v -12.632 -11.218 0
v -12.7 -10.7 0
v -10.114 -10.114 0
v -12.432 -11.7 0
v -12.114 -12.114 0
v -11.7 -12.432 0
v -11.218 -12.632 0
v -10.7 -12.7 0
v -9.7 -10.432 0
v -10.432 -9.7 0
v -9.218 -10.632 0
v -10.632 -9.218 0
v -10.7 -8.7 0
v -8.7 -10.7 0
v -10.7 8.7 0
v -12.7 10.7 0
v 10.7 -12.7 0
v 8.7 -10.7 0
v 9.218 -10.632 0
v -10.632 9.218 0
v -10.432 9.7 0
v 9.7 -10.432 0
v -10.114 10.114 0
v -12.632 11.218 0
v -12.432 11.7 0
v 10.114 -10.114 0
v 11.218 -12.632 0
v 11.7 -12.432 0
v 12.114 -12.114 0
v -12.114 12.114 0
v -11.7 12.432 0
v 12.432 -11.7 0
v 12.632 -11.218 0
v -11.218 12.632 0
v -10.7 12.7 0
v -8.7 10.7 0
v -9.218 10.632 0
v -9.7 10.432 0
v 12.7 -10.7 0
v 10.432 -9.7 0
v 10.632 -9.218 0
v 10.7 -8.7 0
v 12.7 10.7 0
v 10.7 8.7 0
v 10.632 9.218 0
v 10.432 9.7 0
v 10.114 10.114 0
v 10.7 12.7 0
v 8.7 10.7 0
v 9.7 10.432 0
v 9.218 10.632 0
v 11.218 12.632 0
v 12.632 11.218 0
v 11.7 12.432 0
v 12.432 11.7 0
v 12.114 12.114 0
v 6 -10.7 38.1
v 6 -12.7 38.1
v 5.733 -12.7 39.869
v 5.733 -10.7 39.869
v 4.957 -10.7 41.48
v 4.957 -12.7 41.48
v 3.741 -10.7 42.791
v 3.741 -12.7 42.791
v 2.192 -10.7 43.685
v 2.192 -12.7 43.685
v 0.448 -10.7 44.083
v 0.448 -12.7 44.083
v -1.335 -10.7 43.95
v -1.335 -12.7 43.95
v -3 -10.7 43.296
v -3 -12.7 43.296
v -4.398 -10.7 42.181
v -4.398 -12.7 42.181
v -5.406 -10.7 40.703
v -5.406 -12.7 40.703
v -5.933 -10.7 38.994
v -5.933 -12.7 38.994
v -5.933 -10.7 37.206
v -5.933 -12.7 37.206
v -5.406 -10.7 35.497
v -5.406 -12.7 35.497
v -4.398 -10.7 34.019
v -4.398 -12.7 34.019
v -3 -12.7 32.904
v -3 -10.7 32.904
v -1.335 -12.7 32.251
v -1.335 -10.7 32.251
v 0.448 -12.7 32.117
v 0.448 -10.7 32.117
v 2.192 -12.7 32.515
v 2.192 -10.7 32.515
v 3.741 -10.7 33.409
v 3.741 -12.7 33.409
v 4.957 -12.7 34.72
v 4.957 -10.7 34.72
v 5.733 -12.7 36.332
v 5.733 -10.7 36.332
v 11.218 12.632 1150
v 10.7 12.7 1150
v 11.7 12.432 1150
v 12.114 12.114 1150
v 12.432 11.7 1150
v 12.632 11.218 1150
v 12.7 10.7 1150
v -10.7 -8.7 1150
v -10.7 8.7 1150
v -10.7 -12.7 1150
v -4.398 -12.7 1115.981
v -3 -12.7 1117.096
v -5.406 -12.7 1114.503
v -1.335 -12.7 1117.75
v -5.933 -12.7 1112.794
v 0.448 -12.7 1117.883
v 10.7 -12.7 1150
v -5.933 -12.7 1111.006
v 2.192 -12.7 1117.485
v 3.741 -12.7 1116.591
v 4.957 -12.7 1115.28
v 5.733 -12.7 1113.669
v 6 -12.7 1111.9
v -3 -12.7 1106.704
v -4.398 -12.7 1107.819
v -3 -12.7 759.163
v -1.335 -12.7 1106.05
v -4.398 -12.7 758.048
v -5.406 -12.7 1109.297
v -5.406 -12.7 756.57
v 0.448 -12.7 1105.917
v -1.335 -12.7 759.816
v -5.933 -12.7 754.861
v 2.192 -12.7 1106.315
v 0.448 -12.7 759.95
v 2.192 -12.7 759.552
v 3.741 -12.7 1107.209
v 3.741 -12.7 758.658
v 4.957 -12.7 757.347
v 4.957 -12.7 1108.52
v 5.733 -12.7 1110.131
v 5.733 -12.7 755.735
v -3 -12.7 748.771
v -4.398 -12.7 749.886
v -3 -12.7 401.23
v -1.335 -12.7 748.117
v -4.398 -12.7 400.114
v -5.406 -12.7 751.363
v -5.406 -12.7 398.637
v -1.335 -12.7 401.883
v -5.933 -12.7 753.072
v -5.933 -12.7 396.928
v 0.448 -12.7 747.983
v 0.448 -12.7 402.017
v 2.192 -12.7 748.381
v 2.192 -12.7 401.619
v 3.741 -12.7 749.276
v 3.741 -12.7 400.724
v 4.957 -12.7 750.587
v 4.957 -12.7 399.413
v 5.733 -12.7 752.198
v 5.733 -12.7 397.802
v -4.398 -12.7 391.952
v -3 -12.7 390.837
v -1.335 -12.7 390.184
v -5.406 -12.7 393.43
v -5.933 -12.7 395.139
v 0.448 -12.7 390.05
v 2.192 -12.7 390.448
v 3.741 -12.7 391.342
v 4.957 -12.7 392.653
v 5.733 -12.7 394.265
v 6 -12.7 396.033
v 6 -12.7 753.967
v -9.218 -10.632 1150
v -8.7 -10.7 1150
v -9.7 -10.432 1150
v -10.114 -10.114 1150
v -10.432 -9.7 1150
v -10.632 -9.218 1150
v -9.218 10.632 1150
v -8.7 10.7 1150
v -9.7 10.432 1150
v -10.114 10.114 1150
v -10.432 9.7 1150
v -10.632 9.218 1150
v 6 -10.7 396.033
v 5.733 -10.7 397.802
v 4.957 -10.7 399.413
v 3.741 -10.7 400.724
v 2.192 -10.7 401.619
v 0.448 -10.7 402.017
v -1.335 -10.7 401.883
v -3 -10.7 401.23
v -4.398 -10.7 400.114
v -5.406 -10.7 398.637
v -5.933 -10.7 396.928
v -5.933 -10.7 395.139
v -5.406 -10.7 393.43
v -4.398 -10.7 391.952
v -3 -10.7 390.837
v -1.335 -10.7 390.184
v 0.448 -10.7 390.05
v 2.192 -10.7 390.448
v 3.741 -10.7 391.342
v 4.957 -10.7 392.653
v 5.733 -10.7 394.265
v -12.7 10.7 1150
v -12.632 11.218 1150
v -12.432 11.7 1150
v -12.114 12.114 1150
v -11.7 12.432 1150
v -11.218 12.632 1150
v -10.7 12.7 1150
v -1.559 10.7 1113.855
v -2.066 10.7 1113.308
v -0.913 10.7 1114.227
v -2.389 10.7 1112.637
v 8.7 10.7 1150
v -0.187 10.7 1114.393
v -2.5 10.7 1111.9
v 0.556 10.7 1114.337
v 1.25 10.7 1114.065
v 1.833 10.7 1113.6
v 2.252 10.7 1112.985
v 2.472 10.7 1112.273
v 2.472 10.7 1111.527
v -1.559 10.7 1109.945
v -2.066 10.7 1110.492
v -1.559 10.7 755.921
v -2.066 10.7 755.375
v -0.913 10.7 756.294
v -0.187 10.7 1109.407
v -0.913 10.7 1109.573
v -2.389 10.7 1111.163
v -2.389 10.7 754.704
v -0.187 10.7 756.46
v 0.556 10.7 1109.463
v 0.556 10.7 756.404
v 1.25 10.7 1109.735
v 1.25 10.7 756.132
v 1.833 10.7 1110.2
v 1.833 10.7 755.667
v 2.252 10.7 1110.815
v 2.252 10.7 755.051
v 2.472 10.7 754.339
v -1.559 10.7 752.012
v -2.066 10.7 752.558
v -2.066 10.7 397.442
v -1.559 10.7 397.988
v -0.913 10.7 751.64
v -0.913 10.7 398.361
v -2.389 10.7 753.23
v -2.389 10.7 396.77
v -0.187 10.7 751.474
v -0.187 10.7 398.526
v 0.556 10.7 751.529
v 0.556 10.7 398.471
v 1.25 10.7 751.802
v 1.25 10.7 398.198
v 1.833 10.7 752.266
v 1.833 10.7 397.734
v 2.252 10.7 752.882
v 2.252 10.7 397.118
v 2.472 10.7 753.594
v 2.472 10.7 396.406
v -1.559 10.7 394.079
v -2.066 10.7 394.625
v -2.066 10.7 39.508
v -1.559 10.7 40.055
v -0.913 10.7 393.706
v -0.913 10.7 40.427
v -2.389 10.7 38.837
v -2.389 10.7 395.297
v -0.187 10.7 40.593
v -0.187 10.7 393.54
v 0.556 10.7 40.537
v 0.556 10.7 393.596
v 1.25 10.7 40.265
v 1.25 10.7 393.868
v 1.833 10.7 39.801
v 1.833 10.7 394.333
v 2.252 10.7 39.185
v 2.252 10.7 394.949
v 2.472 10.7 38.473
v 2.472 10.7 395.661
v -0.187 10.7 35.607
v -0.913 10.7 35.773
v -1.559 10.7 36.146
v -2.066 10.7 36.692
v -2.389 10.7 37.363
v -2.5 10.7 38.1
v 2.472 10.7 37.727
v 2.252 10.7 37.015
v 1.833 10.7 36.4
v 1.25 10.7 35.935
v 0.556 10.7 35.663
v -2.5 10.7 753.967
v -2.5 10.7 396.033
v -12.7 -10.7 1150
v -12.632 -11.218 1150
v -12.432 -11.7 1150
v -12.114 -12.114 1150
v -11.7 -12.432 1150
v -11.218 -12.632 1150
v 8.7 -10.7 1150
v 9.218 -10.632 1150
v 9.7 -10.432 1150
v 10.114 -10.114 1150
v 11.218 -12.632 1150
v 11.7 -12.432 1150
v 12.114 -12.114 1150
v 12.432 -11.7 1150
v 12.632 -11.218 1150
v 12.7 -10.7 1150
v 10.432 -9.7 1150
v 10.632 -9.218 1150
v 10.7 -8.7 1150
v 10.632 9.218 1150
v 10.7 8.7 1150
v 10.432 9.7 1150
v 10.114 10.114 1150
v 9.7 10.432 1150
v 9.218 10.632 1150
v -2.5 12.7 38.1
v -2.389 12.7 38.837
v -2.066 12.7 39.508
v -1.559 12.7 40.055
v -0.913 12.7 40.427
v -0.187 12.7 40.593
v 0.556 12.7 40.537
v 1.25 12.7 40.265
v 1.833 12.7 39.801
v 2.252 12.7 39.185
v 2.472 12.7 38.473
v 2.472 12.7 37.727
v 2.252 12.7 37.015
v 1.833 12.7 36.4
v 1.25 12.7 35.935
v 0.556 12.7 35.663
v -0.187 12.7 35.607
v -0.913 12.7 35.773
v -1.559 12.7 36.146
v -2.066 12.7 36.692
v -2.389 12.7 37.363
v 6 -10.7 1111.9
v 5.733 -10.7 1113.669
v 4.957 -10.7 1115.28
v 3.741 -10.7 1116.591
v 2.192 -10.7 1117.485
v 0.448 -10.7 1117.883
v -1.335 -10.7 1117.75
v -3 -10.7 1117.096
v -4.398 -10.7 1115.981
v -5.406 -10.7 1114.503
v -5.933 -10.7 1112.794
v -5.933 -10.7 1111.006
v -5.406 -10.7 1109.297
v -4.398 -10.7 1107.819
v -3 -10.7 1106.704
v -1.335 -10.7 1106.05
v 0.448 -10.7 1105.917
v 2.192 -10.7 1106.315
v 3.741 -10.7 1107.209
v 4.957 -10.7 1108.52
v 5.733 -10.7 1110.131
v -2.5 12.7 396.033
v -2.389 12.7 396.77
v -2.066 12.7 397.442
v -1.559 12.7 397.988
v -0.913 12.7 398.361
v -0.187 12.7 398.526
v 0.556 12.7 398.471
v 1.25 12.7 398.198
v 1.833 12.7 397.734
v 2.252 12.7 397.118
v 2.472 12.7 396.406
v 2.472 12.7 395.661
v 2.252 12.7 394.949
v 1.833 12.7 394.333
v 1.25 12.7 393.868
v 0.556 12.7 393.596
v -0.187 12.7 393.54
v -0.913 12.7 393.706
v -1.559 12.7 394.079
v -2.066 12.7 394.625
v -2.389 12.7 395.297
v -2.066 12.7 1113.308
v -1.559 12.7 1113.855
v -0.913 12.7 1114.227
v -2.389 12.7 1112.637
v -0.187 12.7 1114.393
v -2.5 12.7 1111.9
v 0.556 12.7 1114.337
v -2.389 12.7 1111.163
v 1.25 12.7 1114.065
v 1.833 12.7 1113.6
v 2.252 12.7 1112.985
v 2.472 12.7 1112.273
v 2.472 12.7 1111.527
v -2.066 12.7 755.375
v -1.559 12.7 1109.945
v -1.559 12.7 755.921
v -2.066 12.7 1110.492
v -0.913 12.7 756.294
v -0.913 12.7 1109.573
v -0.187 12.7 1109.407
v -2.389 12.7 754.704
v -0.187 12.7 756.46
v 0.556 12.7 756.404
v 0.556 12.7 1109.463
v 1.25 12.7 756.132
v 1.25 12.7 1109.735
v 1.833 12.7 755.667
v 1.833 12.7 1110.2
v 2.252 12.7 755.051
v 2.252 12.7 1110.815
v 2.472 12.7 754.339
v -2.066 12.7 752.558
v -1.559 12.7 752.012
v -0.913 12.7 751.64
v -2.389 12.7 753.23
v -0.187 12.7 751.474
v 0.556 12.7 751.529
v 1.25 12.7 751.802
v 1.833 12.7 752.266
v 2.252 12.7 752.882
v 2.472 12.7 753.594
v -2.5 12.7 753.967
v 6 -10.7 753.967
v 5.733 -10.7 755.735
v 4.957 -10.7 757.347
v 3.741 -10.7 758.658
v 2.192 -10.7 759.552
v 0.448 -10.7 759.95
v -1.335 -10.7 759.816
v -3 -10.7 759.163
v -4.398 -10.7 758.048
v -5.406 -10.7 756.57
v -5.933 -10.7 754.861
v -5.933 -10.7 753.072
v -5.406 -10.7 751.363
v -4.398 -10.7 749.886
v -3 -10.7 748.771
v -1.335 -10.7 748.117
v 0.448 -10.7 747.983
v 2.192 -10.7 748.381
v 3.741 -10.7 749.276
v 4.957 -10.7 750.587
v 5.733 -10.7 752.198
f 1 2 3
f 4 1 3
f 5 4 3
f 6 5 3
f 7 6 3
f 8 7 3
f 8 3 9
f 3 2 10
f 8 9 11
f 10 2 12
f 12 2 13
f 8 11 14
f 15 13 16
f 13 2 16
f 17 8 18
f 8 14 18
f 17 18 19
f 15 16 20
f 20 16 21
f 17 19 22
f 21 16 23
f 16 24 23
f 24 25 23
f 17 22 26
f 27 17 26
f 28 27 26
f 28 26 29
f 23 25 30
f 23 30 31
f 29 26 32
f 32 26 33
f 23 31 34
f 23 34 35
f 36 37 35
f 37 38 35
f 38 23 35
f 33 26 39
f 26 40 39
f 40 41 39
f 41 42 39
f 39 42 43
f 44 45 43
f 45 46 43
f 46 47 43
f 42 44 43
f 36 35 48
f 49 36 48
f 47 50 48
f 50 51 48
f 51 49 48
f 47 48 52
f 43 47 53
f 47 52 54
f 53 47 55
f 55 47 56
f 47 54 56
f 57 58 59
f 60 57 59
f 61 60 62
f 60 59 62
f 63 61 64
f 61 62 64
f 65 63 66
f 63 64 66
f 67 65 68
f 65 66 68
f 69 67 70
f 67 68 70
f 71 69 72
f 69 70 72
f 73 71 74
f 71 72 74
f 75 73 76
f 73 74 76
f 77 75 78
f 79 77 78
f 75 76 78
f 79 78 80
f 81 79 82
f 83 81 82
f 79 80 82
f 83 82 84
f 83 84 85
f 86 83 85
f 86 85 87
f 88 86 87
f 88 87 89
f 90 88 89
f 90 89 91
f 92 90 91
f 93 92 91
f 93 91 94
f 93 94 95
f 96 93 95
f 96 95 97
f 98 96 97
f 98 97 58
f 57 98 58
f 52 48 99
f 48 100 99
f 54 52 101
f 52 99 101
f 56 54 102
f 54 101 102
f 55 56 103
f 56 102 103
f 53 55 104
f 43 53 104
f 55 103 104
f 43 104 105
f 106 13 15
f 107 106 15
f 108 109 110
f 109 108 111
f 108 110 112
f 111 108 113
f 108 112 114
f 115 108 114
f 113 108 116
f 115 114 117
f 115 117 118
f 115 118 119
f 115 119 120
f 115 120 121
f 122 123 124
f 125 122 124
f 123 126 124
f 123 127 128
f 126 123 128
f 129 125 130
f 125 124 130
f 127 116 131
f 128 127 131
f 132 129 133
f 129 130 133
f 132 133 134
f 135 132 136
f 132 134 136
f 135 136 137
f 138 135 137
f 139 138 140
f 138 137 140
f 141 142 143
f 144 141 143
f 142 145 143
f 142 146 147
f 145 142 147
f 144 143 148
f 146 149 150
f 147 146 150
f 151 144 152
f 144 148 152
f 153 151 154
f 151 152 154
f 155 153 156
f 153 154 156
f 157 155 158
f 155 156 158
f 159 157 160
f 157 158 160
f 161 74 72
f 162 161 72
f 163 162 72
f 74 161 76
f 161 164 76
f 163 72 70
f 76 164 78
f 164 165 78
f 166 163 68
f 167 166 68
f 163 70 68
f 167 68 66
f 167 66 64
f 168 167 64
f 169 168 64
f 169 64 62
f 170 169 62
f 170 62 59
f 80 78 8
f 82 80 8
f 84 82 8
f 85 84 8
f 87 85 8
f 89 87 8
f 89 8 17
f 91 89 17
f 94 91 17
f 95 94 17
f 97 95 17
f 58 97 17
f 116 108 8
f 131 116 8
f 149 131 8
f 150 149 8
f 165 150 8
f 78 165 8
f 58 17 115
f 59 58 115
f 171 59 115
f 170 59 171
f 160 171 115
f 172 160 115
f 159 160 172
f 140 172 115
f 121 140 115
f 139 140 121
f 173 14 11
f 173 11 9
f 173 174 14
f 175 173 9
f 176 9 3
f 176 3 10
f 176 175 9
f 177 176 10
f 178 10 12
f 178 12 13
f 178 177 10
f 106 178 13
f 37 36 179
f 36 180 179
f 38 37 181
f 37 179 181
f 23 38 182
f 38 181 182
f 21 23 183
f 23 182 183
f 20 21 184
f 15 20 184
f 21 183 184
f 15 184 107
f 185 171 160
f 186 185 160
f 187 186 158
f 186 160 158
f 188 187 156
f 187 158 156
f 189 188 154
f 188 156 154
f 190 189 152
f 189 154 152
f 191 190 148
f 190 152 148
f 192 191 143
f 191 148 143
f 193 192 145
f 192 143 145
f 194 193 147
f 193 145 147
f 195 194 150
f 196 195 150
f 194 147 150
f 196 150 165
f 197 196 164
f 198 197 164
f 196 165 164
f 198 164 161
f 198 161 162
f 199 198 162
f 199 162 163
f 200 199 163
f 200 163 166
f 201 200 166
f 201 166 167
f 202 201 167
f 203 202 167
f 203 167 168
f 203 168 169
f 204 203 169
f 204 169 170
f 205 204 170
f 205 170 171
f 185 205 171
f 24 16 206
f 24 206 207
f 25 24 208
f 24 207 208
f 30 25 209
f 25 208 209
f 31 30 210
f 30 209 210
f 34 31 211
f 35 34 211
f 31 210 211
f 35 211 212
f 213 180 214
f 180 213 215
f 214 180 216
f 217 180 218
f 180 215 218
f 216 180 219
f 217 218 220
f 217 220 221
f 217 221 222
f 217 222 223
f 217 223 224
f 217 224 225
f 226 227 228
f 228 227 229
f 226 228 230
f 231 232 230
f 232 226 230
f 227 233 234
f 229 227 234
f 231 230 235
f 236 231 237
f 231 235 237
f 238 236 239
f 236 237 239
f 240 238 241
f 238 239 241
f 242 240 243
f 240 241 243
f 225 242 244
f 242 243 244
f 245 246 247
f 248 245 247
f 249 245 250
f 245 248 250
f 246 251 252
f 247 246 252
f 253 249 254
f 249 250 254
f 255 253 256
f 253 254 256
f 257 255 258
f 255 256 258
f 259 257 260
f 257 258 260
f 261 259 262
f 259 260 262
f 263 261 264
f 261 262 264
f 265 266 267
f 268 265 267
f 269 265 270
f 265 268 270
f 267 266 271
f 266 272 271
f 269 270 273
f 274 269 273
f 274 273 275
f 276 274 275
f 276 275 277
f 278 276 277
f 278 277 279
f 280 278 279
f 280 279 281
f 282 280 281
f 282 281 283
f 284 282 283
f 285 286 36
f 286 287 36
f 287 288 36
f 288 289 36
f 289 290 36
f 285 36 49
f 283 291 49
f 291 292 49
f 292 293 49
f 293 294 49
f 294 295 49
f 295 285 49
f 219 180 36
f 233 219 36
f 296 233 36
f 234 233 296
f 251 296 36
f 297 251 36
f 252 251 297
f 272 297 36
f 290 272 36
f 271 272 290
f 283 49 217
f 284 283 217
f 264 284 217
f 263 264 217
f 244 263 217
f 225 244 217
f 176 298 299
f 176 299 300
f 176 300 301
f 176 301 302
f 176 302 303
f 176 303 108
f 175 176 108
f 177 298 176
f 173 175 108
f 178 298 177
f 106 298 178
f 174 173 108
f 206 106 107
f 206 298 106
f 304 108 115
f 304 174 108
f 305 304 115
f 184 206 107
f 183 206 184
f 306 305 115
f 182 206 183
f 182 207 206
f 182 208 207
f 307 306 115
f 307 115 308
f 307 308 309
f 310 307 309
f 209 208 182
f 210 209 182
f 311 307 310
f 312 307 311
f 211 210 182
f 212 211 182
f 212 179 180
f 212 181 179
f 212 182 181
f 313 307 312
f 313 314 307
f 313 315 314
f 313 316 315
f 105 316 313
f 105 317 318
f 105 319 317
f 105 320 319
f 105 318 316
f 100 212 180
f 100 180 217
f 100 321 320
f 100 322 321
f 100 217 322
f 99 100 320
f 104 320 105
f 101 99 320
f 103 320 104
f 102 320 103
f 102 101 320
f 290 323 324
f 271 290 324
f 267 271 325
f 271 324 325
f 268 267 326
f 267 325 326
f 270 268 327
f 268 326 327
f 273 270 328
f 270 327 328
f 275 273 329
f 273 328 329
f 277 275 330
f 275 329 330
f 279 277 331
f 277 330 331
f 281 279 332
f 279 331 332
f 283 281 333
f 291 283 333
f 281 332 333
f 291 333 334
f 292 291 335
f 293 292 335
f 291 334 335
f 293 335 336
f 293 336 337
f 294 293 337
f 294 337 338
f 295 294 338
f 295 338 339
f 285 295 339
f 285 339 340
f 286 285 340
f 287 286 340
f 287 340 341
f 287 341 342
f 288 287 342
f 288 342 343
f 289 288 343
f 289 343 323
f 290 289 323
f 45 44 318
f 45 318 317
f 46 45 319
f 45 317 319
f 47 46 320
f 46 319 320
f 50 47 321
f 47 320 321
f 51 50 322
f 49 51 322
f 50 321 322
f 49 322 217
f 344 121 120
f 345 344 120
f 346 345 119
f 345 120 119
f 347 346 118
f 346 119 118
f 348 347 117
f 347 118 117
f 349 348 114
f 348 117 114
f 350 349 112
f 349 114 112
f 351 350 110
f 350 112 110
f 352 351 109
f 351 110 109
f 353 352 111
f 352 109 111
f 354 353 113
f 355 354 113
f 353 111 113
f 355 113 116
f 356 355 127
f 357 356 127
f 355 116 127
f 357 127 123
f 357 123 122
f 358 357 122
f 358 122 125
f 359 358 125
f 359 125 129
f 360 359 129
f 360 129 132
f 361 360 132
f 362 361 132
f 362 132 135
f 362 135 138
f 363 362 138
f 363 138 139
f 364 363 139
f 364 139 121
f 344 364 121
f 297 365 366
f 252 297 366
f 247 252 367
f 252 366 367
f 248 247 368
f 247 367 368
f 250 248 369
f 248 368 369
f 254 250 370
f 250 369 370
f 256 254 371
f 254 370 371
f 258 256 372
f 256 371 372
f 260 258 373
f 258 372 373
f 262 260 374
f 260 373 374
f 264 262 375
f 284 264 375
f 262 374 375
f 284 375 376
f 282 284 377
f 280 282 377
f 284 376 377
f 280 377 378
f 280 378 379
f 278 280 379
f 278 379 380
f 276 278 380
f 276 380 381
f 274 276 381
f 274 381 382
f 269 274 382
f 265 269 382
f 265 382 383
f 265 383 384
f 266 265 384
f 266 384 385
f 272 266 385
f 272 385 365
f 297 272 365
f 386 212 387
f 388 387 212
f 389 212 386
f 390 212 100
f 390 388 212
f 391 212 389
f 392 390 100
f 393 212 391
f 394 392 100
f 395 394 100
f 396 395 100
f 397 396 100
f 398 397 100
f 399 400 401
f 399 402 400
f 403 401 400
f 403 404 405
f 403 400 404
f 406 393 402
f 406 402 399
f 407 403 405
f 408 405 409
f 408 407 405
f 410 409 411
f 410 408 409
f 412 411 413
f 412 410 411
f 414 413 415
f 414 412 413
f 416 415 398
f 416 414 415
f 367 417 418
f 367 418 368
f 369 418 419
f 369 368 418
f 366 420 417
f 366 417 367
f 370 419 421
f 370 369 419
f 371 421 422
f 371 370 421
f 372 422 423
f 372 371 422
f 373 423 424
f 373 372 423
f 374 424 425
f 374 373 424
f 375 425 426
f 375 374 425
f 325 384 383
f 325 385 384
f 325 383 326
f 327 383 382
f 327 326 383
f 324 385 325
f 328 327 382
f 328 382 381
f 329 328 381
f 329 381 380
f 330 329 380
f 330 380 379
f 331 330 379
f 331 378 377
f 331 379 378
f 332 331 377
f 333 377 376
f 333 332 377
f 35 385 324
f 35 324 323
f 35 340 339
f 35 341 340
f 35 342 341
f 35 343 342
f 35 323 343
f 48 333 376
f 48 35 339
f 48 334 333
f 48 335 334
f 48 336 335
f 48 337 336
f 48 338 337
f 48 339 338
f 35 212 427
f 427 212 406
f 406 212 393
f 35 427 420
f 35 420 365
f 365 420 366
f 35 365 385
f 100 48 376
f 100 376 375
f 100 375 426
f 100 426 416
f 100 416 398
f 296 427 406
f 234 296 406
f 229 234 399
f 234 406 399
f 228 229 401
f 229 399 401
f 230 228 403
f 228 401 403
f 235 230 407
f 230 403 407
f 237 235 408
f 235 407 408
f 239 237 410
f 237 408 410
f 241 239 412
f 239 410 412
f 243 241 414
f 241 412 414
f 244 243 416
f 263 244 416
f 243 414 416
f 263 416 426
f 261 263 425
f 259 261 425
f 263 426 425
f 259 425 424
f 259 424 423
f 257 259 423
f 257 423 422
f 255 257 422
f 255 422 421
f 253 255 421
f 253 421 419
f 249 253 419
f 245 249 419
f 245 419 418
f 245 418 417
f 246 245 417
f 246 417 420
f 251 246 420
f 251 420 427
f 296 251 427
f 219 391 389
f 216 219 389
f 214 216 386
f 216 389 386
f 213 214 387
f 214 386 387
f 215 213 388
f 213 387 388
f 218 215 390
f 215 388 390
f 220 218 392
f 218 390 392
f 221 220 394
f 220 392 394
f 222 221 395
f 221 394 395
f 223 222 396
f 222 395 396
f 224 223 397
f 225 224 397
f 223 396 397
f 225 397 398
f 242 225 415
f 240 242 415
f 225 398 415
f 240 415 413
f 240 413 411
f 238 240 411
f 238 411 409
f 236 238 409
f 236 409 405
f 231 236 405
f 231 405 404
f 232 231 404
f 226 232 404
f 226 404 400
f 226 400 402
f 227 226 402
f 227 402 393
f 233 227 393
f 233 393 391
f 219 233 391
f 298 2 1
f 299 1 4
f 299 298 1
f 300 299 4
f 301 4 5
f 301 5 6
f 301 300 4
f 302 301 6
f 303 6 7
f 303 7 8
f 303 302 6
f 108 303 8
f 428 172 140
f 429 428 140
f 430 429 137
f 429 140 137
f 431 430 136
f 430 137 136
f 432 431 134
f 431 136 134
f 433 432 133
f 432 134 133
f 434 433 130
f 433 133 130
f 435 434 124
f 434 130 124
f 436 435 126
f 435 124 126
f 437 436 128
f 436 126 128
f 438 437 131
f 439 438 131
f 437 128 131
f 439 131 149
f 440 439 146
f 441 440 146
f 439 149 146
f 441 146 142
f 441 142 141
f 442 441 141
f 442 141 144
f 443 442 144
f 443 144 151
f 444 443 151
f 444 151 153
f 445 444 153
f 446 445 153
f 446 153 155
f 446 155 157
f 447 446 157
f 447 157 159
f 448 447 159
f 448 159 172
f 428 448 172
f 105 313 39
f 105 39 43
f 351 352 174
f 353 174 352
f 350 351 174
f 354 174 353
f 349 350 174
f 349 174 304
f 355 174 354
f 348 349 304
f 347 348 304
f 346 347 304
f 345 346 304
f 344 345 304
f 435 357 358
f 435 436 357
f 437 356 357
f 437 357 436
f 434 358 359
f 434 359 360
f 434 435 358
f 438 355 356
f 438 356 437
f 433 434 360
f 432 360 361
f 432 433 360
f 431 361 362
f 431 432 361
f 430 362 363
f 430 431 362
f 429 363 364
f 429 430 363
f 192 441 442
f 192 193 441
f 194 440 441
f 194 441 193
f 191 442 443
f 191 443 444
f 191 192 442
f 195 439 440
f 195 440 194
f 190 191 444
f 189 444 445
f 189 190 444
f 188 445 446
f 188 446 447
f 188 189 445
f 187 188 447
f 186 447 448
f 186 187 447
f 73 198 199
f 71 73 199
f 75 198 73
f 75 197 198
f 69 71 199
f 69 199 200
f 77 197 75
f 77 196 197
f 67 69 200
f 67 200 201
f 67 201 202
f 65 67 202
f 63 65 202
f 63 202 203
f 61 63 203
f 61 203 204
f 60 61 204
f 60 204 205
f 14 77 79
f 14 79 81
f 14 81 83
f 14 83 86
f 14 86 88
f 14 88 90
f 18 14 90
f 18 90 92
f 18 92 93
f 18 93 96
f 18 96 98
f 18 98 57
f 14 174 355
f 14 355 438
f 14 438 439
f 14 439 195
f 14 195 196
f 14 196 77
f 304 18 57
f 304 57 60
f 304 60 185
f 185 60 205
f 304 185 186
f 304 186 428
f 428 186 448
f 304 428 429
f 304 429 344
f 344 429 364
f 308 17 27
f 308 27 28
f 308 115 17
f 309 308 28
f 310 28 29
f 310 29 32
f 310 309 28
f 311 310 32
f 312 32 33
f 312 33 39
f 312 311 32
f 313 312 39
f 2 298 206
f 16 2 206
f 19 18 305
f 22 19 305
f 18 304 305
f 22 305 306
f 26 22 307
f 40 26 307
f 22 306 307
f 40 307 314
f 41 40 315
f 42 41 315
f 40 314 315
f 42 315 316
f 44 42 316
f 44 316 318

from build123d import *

# Parameters (mm, degrees)
CROQUIS1_W              = 25.4
CROQUIS1_H              = 25.4
CROQUIS1_W_2            = 21.4
CROQUIS1_H_2            = 21.4
SALIENTE_EXTRUIR1_DEPTH = 1150
REDONDEO1_R             = 2
CROQUIS2_R              = 2.5
CORTAR_EXTRUIR1_DEPTH   = 10
MATRIZL1_COUNT          = 4
MATRIZL1_PITCH          = 357.9333
CROQUIS3_R              = 6
CORTAR_EXTRUIR2_DEPTH   = 10
MATRIZL2_COUNT          = 4
MATRIZL2_PITCH          = 357.9333


with BuildPart() as part:
    # Croquis1 → Saliente-Extruir1 (new body)
    with BuildSketch(Plane.XY):
        Rectangle(CROQUIS1_W, CROQUIS1_H)
        Rectangle(CROQUIS1_W_2, CROQUIS1_H_2, mode=Mode.SUBTRACT)
    extrude(amount=SALIENTE_EXTRUIR1_DEPTH)

    # Redondeo1
    redondeo1_edges = [part.edges().sort_by_distance(p)[0] for p in [
        (-10.7, 10.7, 575),
        (-10.7, -10.7, 575),
        (10.7, -10.7, 575),
        (10.7, 10.7, 575),
        (-12.7, 12.7, 575),
        (12.7, 12.7, 575),
        (12.7, -12.7, 575),
        (-12.7, -12.7, 575),
    ]]
    fillet(redondeo1_edges, radius=REDONDEO1_R)

    # Croquis2 → Cortar-Extruir1 (cut)
    with BuildSketch(Plane(origin=(0, 12.7, 0), x_dir=(1, 0, 0), z_dir=(0, 1, 0))):
        with Locations(Location((0, -1111.9, 0), (0, 0, 180))):
            Circle(CROQUIS2_R)
    cortar_extruir1 = extrude(amount=-CORTAR_EXTRUIR1_DEPTH, mode=Mode.SUBTRACT)

    # MatrizL1: Cortar-Extruir1 ×4
    with Locations(*[(0, 0, -i * MATRIZL1_PITCH) for i in range(1, MATRIZL1_COUNT)]):
        add(cortar_extruir1, mode=Mode.SUBTRACT)

    # Croquis3 → Cortar-Extruir2 (cut)
    with BuildSketch(Plane.XZ.offset(12.7)):
        with Locations((0, 1111.9)):
            Circle(CROQUIS3_R)
    cortar_extruir2 = extrude(amount=-CORTAR_EXTRUIR2_DEPTH, mode=Mode.SUBTRACT)

    # MatrizL2: Cortar-Extruir2 ×4
    with Locations(*[(0, 0, -i * MATRIZL2_PITCH) for i in range(1, MATRIZL2_COUNT)]):
        add(cortar_extruir2, mode=Mode.SUBTRACT)


solid = part.part
